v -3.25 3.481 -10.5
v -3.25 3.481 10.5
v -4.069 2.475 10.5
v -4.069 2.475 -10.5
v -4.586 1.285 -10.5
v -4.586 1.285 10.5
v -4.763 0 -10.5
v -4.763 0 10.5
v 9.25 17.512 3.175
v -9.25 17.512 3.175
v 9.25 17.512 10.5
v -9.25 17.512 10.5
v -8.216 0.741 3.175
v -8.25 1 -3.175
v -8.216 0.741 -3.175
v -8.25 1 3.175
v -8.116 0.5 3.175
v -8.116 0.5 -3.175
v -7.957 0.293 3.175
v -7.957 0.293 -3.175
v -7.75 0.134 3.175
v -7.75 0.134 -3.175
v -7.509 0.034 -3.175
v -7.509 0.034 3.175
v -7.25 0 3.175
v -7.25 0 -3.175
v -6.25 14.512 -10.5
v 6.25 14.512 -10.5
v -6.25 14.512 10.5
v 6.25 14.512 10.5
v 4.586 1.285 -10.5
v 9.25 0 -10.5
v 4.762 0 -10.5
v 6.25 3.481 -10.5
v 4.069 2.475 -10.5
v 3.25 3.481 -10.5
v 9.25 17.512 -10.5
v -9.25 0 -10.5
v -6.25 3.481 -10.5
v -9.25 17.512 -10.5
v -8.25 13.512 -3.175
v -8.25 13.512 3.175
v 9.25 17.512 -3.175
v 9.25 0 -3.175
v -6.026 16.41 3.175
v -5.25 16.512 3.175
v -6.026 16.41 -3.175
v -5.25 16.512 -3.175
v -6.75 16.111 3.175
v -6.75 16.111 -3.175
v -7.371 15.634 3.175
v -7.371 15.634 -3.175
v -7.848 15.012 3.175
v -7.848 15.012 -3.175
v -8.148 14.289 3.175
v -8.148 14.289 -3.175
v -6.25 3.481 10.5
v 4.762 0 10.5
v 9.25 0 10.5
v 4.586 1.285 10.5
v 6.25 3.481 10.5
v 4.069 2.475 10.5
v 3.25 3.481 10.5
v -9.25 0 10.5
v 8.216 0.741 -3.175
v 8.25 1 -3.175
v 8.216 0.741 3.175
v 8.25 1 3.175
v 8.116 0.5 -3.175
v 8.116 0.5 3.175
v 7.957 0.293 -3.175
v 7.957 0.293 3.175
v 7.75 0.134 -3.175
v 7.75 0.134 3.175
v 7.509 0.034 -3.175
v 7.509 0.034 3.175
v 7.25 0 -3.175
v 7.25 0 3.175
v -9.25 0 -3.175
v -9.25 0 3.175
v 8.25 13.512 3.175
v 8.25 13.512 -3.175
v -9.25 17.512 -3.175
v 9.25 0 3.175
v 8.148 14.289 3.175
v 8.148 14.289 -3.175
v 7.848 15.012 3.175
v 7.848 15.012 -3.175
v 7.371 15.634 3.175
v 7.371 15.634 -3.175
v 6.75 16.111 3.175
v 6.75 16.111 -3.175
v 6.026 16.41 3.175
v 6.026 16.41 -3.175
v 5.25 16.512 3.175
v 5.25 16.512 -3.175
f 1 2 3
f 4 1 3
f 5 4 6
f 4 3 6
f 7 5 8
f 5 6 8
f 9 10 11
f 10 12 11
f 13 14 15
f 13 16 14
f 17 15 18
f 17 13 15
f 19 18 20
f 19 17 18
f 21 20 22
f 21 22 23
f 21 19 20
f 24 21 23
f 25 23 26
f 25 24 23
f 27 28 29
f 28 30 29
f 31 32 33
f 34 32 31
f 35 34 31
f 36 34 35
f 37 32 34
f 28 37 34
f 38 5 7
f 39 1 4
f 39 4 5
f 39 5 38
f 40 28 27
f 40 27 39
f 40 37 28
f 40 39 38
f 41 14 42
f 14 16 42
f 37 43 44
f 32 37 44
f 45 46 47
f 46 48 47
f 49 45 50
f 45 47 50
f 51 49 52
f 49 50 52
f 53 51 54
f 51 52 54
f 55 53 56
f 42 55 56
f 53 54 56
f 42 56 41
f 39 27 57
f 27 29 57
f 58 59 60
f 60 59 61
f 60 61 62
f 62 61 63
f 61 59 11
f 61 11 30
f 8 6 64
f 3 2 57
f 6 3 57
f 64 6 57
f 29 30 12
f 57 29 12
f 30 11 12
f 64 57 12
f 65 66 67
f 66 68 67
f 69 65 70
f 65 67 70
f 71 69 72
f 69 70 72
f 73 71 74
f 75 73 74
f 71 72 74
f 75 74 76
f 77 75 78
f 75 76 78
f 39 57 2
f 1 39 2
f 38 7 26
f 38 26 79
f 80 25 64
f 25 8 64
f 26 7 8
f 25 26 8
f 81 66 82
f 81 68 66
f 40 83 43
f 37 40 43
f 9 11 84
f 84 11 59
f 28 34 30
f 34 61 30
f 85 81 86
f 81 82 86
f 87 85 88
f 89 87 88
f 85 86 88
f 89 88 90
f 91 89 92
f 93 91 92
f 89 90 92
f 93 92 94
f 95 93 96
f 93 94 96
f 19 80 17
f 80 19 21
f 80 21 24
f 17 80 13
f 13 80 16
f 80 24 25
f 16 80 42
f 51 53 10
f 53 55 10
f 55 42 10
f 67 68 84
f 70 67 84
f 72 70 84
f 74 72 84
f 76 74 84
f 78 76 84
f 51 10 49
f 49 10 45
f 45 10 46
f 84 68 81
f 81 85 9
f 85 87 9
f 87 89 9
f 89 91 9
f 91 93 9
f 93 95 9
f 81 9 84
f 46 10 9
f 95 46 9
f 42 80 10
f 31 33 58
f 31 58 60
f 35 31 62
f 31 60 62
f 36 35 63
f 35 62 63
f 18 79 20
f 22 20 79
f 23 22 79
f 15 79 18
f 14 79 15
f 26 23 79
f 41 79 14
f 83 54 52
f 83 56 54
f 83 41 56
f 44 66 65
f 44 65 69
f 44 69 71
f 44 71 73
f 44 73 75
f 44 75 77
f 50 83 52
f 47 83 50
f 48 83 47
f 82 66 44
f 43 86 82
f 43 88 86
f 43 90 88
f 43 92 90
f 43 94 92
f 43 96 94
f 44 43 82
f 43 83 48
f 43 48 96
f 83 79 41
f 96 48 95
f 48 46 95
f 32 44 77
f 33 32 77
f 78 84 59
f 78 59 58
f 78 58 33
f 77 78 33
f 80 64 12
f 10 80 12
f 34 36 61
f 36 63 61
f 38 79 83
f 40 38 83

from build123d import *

# Parameters (mm, degrees)
BOSS_EXTRUDE1_DEPTH = 10.5
CUT_EXTRUDE1_DEPTH  = 3.175
FILLET1_R           = 3
FILLET2_R           = 1


with BuildPart() as part:
    # Sketch1 → Boss-Extrude1 (new, symmetric)
    with BuildSketch(Plane.XY):
        with BuildLine():
            Line((-4.7625, 0), (-9.25, 0))
            Line((-9.25, 0), (-9.25, 17.5125))
            Line((-9.25, 17.5125), (9.25, 17.5125))
            Line((9.25, 17.5125), (9.25, 0))
            Line((9.25, 0), (4.7625, 0))
            ThreePointArc((4.7625, 0), (4.368039105, 1.89779889), (3.25, 3.481221948))
            Line((3.25, 3.481221948), (6.25, 3.481221948))
            Line((6.25, 3.481221948), (6.25, 14.5125))
            Line((6.25, 14.5125), (-6.25, 14.5125))
            Line((-6.25, 14.5125), (-6.25, 3.481221948))
            Line((-6.25, 3.481221948), (-3.25, 3.481221948))
            ThreePointArc((-3.25, 3.481221948), (-4.368039105, 1.89779889), (-4.7625, 0))
        make_face()
    extrude(amount=BOSS_EXTRUDE1_DEPTH, both=True)

    # Sketch2 → Cut-Extrude1 (cut, symmetric)
    with BuildSketch(Plane.XY):
        Polygon((0, 17.5125), (-9.25, 17.5125), (-9.25, 0), (-8.25, 0), (-8.25, 16.5125), (0, 16.5125), align=None)
    cut_extrude1 = extrude(amount=CUT_EXTRUDE1_DEPTH, both=True, mode=Mode.SUBTRACT)

    # Mirror1: Cut-Extrude1 across plane
    add(cut_extrude1.mirror(Plane(origin=(0, 0, 0), x_dir=(0, 0, 1), z_dir=(1, 0, 0))), mode=Mode.SUBTRACT)

    # Fillet1
    fillet1_edges = [part.edges().sort_by_distance(p)[0] for p in [
        (-8.25, 16.5125, 0),
        (8.25, 16.5125, 0),
    ]]
    fillet(fillet1_edges, radius=FILLET1_R)

    # Fillet2
    fillet2_edges = [part.edges().sort_by_distance(p)[0] for p in [
        (-8.25, 0, 0),
        (8.25, 0, 0),
    ]]
    fillet(fillet2_edges, radius=FILLET2_R)


solid = part.part
